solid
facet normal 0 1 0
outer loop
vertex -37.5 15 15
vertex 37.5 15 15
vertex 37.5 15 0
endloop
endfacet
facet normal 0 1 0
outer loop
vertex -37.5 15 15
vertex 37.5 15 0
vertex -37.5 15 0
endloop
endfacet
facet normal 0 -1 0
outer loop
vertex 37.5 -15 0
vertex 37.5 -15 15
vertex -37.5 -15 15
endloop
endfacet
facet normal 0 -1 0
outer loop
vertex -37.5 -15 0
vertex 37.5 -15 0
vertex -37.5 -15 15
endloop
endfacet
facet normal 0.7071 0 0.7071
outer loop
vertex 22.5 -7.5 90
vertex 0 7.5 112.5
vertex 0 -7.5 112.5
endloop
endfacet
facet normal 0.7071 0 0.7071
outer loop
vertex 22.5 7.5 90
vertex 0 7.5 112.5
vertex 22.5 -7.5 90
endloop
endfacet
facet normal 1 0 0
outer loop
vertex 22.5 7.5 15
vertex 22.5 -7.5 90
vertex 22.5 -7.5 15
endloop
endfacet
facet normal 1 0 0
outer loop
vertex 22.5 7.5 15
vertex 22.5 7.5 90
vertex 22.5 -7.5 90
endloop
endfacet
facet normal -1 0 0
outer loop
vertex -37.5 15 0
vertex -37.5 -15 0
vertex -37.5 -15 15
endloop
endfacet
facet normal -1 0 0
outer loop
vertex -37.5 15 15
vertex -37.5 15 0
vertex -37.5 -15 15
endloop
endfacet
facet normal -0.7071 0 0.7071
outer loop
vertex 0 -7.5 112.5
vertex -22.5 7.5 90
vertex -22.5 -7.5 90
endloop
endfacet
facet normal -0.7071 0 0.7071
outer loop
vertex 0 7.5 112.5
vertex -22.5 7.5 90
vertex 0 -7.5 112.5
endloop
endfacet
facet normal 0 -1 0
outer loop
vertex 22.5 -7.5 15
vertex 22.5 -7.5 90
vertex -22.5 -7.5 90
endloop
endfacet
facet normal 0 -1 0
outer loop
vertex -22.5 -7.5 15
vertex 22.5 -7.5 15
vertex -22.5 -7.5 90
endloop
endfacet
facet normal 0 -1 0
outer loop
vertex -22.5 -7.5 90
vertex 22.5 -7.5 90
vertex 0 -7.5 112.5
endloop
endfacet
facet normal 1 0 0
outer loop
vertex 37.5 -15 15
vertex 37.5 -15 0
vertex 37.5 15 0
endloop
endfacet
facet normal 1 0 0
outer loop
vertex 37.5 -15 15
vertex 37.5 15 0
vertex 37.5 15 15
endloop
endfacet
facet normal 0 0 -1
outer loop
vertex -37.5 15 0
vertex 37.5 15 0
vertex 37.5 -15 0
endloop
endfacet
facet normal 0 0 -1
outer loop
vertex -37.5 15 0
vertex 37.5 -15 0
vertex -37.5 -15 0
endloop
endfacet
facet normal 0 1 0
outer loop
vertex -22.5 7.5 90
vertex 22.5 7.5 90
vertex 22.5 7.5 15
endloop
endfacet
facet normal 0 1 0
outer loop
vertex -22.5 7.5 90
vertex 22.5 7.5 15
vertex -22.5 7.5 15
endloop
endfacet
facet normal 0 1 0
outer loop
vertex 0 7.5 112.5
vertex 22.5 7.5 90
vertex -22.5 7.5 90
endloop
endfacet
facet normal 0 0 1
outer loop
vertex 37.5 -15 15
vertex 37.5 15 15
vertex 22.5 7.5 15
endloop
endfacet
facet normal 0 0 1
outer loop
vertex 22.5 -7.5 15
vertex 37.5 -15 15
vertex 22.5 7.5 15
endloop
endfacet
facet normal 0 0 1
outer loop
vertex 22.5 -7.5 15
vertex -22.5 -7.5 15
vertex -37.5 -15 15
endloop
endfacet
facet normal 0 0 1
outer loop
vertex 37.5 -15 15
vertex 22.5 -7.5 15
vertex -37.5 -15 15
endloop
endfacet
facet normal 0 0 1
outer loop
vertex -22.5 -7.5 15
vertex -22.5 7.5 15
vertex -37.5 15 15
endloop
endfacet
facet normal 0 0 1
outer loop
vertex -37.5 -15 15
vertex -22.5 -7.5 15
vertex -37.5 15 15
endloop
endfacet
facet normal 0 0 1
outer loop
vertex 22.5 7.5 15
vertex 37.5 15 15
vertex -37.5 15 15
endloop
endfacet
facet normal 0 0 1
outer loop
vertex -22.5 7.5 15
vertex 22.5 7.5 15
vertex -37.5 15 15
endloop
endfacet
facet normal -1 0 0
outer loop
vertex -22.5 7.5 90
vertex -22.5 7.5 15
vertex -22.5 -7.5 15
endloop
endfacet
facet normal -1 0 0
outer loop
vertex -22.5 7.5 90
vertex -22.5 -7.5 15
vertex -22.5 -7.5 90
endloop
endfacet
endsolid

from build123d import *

# Parameters (mm, degrees)
BOSS_EXTRUDE1_DEPTH = 15
BOSS_EXTRUDE2_DEPTH = 7.5


with BuildPart() as part:
    # Sketch1 → Boss-Extrude1 (new, symmetric)
    with BuildSketch(Plane(origin=(0, 0, 0), x_dir=(-1, 0, 0), z_dir=(0, 1, 0))):
        Polygon((-37.5, 15), (-37.5, 0), (37.5, 0), (37.5, 15), (22.5, 15), (-22.5, 15), align=None)
    extrude(amount=BOSS_EXTRUDE1_DEPTH, both=True)

    # Sketch1<3> → Boss-Extrude2 (add, symmetric)
    with BuildSketch(Plane(origin=(0, 0, 0), x_dir=(-1, 0, 0), z_dir=(0, 1, 0))):
        Polygon((-22.5, 90), (-22.5, 15), (22.5, 15), (22.5, 90), (0, 112.5), align=None)
    extrude(amount=BOSS_EXTRUDE2_DEPTH, both=True)


solid = part.part
